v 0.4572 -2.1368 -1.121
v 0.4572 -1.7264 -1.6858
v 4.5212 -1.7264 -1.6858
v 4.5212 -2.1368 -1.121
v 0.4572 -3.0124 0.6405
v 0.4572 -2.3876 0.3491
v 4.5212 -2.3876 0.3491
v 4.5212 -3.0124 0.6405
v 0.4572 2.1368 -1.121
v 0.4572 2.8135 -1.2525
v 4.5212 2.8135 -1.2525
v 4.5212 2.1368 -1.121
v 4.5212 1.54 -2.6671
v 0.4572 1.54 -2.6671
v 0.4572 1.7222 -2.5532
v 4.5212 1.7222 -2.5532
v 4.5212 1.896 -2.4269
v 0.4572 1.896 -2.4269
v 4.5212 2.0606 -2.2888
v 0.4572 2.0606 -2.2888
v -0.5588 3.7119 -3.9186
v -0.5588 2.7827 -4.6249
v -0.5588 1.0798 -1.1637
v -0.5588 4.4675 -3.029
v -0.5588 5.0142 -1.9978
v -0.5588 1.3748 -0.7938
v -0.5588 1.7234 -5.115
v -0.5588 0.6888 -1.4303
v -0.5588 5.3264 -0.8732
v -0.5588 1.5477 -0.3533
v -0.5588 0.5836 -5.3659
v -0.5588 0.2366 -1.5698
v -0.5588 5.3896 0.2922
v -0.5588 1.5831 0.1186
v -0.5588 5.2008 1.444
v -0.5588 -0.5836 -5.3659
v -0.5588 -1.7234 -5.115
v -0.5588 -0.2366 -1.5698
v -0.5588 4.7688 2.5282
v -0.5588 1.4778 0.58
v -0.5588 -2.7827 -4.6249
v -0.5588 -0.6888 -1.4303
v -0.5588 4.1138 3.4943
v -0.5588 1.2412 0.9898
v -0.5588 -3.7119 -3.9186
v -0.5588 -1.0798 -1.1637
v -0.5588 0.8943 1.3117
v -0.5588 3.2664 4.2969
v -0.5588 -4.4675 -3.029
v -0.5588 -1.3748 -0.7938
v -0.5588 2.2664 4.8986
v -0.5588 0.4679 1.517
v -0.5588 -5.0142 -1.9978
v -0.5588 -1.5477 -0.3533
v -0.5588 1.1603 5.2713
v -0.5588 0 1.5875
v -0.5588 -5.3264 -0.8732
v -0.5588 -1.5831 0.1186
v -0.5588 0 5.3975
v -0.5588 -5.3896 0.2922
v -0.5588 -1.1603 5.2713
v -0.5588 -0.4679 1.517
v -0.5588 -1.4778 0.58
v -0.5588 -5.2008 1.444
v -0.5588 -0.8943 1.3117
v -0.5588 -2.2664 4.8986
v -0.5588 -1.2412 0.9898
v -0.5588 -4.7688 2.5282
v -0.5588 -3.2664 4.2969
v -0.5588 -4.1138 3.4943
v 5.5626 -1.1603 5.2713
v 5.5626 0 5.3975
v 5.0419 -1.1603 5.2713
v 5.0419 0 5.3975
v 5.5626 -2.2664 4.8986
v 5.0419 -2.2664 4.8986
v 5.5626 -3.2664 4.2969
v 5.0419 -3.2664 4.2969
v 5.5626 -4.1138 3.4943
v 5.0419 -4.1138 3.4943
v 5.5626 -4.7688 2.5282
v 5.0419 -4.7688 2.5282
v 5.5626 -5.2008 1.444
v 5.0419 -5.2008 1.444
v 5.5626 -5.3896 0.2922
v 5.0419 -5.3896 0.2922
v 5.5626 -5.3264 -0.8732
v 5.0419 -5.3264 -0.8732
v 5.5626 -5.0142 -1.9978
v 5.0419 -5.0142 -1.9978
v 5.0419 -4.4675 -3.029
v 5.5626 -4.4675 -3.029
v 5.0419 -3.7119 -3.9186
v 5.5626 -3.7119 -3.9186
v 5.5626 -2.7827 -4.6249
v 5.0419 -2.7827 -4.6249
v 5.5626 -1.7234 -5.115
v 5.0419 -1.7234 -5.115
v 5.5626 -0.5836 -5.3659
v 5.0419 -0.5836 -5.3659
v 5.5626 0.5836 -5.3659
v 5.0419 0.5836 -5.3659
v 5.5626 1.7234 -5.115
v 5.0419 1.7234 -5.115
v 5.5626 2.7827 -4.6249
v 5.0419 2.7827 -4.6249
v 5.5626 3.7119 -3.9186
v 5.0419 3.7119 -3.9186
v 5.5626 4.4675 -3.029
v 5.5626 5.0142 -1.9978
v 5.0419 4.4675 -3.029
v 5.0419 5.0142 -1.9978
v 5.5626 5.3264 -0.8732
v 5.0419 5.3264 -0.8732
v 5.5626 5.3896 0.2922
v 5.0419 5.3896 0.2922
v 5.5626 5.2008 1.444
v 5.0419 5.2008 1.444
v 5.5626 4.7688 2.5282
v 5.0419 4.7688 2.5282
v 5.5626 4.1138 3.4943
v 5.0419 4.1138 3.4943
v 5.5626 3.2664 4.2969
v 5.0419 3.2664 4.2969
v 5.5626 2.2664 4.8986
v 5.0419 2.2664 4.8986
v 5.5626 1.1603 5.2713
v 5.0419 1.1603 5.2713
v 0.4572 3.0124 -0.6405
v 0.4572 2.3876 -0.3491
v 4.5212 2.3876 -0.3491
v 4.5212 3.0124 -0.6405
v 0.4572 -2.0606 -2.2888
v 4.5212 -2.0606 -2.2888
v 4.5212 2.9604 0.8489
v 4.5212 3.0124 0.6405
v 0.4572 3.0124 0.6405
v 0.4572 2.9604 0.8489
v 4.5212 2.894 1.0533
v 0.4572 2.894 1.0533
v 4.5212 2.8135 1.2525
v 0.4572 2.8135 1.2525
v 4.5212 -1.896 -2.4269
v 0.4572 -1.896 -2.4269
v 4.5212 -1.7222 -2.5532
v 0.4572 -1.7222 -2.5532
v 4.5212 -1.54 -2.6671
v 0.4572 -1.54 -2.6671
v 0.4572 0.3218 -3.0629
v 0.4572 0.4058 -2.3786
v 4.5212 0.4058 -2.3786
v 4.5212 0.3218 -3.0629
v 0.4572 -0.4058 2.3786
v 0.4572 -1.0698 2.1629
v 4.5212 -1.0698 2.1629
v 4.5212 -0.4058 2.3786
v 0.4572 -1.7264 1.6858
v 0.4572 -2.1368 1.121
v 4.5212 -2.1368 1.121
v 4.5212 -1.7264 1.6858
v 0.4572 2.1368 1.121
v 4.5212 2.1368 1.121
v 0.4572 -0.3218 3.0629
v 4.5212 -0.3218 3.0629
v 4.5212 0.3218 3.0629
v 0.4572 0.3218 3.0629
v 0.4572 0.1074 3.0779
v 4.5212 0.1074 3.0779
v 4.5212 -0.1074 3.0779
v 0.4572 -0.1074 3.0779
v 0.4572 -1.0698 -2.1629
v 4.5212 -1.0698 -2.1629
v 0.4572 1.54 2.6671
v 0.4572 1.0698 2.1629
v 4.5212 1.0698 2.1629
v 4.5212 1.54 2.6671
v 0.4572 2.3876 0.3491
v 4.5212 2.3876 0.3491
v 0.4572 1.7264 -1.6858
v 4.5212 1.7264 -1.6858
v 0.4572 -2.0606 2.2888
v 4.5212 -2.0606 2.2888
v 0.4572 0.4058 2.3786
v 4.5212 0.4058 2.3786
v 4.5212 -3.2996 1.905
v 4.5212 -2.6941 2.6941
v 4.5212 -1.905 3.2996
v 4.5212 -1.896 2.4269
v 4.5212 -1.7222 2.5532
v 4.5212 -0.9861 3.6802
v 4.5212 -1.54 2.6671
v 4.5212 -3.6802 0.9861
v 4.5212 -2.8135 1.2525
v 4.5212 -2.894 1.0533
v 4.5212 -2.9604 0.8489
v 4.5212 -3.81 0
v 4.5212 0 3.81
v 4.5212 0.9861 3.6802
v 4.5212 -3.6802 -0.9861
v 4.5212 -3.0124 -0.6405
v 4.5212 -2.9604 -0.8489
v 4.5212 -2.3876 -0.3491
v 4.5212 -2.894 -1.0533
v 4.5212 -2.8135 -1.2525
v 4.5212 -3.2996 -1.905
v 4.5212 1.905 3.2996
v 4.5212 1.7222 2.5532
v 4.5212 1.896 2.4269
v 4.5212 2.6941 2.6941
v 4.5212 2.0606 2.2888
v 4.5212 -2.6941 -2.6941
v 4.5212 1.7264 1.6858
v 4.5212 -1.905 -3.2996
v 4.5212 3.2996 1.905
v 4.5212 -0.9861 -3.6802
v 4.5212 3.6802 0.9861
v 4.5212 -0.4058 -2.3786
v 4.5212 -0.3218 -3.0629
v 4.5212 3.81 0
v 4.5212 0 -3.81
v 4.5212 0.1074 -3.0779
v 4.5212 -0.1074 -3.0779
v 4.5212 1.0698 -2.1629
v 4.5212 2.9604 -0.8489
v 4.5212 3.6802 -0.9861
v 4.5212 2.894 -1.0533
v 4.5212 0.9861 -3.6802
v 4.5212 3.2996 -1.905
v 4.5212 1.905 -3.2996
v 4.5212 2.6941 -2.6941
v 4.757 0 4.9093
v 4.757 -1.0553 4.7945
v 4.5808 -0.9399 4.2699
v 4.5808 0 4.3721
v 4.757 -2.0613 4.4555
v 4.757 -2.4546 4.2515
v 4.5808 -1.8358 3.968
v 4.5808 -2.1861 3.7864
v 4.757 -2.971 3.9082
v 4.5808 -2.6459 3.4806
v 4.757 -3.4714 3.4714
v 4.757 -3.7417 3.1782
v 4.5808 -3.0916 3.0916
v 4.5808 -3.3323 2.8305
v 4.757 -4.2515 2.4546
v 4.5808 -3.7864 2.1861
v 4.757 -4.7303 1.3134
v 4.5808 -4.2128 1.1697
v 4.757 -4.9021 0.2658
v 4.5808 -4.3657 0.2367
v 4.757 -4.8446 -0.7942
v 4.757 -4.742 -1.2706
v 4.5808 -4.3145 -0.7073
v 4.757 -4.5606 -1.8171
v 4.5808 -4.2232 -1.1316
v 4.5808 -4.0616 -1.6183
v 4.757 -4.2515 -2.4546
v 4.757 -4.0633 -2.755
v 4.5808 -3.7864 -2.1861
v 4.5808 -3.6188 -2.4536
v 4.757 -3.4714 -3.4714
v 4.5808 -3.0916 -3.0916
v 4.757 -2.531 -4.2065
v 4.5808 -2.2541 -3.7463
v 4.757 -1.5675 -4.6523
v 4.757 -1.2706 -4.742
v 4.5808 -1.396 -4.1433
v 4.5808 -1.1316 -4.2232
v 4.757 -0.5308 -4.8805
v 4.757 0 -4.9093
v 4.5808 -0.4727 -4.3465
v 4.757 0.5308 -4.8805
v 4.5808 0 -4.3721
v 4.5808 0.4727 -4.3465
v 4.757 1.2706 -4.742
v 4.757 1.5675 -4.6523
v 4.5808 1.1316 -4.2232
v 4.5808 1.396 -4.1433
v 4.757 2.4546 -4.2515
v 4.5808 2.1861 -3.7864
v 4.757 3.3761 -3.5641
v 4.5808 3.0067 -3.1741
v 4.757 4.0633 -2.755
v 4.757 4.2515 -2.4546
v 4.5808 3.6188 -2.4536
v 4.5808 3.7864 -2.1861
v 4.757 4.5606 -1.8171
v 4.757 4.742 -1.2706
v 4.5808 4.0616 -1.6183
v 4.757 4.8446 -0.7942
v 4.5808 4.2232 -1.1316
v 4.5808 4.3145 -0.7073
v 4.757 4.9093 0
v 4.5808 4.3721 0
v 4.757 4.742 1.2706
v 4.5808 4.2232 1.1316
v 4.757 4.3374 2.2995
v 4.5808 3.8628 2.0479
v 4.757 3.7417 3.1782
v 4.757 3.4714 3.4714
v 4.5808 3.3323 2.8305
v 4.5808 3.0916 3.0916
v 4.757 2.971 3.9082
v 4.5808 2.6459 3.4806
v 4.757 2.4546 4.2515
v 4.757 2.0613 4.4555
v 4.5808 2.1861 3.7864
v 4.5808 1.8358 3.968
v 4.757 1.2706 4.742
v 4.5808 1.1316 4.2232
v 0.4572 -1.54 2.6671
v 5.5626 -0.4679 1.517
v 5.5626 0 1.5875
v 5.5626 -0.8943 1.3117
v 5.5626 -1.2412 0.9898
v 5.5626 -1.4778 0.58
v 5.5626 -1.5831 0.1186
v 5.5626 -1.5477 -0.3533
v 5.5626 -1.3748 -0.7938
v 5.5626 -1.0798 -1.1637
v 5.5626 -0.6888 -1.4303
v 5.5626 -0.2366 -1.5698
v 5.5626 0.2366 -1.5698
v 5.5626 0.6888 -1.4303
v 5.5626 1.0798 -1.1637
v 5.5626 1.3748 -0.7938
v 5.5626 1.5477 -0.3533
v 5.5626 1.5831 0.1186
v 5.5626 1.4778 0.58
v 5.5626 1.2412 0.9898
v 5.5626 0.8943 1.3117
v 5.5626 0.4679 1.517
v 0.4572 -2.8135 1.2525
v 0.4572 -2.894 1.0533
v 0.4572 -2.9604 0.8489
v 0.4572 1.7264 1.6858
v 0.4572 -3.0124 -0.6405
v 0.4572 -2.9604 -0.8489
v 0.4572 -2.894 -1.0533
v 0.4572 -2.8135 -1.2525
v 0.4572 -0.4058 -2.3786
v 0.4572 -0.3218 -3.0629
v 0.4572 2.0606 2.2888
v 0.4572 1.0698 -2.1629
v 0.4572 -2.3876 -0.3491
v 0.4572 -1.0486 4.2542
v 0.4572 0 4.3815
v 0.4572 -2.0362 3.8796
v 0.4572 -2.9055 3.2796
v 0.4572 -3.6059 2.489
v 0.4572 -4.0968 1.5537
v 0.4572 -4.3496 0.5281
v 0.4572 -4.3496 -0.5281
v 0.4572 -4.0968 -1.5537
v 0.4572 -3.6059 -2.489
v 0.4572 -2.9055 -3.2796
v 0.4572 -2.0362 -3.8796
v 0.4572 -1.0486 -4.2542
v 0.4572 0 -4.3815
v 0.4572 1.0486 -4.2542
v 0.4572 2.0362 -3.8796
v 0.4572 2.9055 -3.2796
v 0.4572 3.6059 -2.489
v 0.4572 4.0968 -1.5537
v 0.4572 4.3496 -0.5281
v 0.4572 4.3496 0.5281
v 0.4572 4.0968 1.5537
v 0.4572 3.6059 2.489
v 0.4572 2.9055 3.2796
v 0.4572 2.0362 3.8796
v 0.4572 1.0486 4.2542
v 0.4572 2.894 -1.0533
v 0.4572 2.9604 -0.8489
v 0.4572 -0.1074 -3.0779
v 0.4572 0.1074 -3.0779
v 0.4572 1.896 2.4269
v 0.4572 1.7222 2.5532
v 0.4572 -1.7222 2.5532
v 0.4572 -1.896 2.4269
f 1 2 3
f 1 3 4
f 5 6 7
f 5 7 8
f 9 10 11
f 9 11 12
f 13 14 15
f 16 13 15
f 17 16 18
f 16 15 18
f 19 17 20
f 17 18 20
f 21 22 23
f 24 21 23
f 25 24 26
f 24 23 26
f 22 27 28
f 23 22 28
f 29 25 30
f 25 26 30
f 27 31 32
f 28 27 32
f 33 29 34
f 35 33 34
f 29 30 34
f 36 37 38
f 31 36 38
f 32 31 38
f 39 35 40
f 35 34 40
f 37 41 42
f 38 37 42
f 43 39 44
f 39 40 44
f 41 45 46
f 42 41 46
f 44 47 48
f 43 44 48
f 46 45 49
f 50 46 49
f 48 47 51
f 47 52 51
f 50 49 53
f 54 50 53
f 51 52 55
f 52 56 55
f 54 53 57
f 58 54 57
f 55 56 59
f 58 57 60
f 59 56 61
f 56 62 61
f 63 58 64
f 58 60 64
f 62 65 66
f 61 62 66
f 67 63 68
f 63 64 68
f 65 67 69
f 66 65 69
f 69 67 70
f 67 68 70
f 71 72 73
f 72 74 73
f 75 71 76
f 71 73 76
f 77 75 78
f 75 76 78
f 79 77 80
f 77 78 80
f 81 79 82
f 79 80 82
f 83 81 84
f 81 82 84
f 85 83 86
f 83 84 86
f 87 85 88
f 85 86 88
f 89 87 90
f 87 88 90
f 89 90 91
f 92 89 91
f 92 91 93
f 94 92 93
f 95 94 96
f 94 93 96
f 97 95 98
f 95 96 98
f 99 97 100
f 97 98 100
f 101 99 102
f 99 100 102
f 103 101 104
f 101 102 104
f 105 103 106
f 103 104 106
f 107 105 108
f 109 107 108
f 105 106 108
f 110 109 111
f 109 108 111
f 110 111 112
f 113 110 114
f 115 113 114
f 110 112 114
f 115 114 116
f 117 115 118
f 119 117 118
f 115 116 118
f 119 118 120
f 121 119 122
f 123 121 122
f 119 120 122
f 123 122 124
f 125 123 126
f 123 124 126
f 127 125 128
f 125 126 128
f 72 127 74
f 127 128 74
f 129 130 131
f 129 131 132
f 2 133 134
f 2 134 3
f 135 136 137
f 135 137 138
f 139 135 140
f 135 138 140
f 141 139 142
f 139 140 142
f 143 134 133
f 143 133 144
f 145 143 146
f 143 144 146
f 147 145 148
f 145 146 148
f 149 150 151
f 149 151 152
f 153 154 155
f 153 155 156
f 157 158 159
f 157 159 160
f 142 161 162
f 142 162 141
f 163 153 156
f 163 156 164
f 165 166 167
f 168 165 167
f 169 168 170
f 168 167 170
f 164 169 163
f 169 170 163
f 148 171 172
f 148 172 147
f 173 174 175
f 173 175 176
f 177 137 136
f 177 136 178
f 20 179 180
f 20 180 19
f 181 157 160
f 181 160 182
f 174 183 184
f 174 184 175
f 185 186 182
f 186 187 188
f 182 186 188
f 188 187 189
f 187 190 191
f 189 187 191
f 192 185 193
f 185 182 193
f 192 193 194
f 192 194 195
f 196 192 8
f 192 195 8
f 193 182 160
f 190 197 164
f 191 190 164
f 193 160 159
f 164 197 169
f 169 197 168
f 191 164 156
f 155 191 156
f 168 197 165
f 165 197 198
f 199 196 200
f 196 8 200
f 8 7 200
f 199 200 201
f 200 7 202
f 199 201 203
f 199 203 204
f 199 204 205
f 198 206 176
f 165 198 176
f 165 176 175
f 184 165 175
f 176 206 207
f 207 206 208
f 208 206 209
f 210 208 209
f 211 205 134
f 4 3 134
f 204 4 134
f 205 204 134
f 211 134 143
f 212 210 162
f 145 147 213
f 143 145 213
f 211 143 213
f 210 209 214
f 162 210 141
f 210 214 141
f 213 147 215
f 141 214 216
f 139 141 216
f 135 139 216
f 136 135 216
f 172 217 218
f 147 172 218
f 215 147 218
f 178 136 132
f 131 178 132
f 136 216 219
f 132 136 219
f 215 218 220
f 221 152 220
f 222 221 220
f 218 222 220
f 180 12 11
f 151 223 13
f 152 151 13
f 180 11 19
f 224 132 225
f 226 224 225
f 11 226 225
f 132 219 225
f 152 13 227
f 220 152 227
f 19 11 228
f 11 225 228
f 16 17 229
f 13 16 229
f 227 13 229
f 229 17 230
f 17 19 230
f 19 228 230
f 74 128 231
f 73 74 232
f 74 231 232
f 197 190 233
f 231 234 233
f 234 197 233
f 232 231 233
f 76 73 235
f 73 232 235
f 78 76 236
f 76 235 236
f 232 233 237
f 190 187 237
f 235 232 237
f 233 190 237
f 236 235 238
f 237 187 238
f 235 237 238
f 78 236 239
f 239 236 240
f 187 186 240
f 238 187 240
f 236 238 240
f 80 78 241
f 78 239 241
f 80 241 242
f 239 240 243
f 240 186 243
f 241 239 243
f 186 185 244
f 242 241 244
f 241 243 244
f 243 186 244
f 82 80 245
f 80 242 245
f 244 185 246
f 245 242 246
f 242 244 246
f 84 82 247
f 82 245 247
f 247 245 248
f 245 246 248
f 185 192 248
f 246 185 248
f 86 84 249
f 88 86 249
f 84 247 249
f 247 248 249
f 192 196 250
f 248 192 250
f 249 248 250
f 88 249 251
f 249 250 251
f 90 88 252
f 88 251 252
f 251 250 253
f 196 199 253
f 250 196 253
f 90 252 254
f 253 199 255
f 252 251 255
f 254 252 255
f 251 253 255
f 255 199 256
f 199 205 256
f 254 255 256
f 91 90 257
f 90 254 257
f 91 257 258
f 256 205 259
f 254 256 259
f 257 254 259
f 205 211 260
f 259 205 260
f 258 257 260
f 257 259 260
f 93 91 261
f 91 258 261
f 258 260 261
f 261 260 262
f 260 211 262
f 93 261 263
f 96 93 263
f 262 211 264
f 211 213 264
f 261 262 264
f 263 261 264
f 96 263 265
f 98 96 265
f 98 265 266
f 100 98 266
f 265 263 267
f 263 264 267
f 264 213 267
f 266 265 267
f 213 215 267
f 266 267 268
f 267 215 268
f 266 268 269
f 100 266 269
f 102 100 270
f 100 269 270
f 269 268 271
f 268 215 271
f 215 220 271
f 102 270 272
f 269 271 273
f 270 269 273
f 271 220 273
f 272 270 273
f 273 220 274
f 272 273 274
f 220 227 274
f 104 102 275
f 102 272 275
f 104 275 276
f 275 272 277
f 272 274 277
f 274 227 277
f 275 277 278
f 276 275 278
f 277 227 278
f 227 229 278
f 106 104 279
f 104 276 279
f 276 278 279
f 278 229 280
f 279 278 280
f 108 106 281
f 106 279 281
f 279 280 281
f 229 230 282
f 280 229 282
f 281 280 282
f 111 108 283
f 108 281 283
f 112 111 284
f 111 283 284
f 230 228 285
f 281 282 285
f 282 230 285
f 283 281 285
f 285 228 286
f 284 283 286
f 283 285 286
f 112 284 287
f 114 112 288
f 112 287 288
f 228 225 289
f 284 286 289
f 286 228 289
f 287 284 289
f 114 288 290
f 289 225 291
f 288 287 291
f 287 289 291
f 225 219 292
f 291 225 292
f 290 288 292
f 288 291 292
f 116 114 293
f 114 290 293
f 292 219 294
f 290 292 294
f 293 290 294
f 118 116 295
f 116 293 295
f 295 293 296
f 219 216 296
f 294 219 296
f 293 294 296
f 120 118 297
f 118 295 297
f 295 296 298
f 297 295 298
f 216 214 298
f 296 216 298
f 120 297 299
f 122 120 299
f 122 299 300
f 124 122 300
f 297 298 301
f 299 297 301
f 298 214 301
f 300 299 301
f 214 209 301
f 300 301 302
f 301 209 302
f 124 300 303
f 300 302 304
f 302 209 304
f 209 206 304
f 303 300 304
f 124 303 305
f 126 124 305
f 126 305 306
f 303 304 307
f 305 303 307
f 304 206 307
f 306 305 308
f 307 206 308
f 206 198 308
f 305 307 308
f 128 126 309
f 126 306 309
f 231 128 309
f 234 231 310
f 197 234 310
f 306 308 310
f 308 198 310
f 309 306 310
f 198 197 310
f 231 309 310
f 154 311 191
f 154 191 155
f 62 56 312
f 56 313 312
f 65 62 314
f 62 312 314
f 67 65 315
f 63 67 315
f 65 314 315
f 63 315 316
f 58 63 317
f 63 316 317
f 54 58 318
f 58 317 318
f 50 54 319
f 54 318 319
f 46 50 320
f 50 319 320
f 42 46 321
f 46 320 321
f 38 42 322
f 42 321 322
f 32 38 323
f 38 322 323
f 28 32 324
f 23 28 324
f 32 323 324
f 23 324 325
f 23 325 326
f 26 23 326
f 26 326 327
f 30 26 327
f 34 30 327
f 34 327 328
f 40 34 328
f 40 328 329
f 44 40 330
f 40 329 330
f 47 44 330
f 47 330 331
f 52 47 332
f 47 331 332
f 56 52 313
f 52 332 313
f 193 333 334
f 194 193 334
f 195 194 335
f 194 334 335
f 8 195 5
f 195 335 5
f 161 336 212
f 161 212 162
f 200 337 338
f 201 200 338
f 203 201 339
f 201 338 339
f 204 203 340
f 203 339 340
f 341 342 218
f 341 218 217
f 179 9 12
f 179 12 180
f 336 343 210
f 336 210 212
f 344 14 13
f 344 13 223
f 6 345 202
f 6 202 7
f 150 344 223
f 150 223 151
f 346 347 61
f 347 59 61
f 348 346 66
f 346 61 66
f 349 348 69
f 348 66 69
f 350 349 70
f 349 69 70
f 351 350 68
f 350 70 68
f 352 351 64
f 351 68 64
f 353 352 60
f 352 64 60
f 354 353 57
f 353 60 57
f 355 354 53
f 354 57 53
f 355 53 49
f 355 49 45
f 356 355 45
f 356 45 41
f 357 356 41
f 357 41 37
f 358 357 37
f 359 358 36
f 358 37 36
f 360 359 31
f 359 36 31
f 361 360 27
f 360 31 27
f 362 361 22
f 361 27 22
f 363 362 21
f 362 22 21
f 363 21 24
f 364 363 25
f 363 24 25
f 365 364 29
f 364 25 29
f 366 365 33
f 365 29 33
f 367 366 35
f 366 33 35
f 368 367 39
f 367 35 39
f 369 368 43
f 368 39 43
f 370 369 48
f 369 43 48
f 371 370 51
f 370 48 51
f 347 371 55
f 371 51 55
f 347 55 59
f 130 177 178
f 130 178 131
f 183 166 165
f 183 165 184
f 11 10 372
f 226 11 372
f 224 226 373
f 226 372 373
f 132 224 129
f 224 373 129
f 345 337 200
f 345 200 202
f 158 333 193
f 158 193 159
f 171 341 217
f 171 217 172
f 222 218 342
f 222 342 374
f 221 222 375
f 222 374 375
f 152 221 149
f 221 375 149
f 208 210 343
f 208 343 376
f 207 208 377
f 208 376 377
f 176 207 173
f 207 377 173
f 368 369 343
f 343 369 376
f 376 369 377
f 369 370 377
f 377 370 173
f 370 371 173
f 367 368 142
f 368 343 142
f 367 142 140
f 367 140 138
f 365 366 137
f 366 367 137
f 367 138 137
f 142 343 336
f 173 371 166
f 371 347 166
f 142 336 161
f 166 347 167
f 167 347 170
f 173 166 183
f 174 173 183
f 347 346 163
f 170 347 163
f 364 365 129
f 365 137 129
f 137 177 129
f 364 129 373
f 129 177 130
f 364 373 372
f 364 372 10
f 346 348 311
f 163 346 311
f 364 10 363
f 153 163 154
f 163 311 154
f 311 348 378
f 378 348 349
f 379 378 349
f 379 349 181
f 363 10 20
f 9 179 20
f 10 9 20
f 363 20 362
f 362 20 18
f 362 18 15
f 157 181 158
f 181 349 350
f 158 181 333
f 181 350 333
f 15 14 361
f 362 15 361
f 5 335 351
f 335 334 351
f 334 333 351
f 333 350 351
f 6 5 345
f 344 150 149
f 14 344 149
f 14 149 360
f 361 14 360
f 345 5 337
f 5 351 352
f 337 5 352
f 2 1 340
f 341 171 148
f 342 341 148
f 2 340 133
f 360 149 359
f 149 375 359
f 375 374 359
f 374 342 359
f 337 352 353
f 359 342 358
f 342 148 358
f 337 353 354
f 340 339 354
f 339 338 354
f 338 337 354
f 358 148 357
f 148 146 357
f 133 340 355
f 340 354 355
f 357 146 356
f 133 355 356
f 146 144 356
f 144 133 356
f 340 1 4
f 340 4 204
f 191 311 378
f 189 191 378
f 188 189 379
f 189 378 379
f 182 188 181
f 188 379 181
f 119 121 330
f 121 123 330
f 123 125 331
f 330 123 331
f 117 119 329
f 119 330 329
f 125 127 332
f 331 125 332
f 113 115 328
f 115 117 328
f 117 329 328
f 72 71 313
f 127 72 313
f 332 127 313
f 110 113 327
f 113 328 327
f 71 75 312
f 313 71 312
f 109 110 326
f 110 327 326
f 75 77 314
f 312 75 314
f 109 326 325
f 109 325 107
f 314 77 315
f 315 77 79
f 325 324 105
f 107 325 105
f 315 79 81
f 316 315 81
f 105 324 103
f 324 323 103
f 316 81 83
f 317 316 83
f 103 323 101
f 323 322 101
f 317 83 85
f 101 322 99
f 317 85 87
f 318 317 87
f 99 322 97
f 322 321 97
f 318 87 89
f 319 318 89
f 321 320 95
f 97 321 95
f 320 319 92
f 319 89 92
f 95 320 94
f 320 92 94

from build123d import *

# Parameters (mm, degrees)
SKETCH4_R          = 3.2385
SKETCH4_R_2        = 3.07975
CUT_EXTRUDE2_DEPTH = 4.064
CUT_EXTRUDE1_DEPTH = 4.064
CIRPATTERN1_COUNT  = 10


with BuildPart() as part:
    # Sketch1 → Revolve1 (revolve)
    with BuildSketch(Plane.XY, mode=Mode.PRIVATE) as revolve1_sk:
        with BuildLine():
            Line((-0.5588, 5.3975), (-0.5588, 1.5875))
            Line((-0.5588, 1.5875), (5.5626, 1.5875))
            Line((5.5626, 1.5875), (5.5626, 5.3975))
            Line((5.5626, 5.3975), (5.0419, 5.3975))
            ThreePointArc((5.0419, 5.3975), (4.654699632, 4.645356921), (4.5212, 3.81))
            Line((4.5212, 3.81), (4.5212, 3.2385))
            Line((4.5212, 3.2385), (0.4572, 3.2385))
            Line((0.4572, 3.2385), (0.4572, 4.3815))
            Line((0.4572, 4.3815), (-0.5588, 5.3975))
        make_face()
    revolve(revolve1_sk.sketch.rotate(Axis((-5.5626, 0, 0), (1, 0, 0)), 90), axis=Axis((-5.5626, 0, 0), (1, 0, 0)))

    # Sketch4 → Cut-Extrude2 (cut)
    with BuildSketch(Plane(origin=(0.4572, 0, 0), x_dir=(0, 0, -1), z_dir=(1, 0, 0))):
        Circle(SKETCH4_R)
        Circle(SKETCH4_R_2, mode=Mode.SUBTRACT)
    extrude(amount=CUT_EXTRUDE2_DEPTH, mode=Mode.SUBTRACT)

    # Sketch3 → Cut-Extrude1 (cut)
    with BuildSketch(Plane(origin=(0.4572, 0, 0), x_dir=(0, 0, -1), z_dir=(1, 0, 0))):
        with BuildLine():
            Line((-0.640454656, 3.012420604), (-0.349102168, 2.387613176))
            Line((-0.349102168, 2.387613176), (0.349102168, 2.387613176))
            Line((0.349102168, 2.387613176), (0.640454656, 3.012420604))
            ThreePointArc((0.640454656, 3.012420604), (0, 3.07975), (-0.640454656, 3.012420604))
        make_face()
    cut_extrude1 = extrude(amount=CUT_EXTRUDE1_DEPTH, mode=Mode.SUBTRACT)

    # CirPattern1: Cut-Extrude1 ×10 about axis
    cirpattern1_axis = Axis((0, 0, 0), (1, 0, 0))
    for i in range(1, CIRPATTERN1_COUNT):
        add(cut_extrude1.rotate(cirpattern1_axis, i * 360 / CIRPATTERN1_COUNT), mode=Mode.SUBTRACT)


solid = part.part
